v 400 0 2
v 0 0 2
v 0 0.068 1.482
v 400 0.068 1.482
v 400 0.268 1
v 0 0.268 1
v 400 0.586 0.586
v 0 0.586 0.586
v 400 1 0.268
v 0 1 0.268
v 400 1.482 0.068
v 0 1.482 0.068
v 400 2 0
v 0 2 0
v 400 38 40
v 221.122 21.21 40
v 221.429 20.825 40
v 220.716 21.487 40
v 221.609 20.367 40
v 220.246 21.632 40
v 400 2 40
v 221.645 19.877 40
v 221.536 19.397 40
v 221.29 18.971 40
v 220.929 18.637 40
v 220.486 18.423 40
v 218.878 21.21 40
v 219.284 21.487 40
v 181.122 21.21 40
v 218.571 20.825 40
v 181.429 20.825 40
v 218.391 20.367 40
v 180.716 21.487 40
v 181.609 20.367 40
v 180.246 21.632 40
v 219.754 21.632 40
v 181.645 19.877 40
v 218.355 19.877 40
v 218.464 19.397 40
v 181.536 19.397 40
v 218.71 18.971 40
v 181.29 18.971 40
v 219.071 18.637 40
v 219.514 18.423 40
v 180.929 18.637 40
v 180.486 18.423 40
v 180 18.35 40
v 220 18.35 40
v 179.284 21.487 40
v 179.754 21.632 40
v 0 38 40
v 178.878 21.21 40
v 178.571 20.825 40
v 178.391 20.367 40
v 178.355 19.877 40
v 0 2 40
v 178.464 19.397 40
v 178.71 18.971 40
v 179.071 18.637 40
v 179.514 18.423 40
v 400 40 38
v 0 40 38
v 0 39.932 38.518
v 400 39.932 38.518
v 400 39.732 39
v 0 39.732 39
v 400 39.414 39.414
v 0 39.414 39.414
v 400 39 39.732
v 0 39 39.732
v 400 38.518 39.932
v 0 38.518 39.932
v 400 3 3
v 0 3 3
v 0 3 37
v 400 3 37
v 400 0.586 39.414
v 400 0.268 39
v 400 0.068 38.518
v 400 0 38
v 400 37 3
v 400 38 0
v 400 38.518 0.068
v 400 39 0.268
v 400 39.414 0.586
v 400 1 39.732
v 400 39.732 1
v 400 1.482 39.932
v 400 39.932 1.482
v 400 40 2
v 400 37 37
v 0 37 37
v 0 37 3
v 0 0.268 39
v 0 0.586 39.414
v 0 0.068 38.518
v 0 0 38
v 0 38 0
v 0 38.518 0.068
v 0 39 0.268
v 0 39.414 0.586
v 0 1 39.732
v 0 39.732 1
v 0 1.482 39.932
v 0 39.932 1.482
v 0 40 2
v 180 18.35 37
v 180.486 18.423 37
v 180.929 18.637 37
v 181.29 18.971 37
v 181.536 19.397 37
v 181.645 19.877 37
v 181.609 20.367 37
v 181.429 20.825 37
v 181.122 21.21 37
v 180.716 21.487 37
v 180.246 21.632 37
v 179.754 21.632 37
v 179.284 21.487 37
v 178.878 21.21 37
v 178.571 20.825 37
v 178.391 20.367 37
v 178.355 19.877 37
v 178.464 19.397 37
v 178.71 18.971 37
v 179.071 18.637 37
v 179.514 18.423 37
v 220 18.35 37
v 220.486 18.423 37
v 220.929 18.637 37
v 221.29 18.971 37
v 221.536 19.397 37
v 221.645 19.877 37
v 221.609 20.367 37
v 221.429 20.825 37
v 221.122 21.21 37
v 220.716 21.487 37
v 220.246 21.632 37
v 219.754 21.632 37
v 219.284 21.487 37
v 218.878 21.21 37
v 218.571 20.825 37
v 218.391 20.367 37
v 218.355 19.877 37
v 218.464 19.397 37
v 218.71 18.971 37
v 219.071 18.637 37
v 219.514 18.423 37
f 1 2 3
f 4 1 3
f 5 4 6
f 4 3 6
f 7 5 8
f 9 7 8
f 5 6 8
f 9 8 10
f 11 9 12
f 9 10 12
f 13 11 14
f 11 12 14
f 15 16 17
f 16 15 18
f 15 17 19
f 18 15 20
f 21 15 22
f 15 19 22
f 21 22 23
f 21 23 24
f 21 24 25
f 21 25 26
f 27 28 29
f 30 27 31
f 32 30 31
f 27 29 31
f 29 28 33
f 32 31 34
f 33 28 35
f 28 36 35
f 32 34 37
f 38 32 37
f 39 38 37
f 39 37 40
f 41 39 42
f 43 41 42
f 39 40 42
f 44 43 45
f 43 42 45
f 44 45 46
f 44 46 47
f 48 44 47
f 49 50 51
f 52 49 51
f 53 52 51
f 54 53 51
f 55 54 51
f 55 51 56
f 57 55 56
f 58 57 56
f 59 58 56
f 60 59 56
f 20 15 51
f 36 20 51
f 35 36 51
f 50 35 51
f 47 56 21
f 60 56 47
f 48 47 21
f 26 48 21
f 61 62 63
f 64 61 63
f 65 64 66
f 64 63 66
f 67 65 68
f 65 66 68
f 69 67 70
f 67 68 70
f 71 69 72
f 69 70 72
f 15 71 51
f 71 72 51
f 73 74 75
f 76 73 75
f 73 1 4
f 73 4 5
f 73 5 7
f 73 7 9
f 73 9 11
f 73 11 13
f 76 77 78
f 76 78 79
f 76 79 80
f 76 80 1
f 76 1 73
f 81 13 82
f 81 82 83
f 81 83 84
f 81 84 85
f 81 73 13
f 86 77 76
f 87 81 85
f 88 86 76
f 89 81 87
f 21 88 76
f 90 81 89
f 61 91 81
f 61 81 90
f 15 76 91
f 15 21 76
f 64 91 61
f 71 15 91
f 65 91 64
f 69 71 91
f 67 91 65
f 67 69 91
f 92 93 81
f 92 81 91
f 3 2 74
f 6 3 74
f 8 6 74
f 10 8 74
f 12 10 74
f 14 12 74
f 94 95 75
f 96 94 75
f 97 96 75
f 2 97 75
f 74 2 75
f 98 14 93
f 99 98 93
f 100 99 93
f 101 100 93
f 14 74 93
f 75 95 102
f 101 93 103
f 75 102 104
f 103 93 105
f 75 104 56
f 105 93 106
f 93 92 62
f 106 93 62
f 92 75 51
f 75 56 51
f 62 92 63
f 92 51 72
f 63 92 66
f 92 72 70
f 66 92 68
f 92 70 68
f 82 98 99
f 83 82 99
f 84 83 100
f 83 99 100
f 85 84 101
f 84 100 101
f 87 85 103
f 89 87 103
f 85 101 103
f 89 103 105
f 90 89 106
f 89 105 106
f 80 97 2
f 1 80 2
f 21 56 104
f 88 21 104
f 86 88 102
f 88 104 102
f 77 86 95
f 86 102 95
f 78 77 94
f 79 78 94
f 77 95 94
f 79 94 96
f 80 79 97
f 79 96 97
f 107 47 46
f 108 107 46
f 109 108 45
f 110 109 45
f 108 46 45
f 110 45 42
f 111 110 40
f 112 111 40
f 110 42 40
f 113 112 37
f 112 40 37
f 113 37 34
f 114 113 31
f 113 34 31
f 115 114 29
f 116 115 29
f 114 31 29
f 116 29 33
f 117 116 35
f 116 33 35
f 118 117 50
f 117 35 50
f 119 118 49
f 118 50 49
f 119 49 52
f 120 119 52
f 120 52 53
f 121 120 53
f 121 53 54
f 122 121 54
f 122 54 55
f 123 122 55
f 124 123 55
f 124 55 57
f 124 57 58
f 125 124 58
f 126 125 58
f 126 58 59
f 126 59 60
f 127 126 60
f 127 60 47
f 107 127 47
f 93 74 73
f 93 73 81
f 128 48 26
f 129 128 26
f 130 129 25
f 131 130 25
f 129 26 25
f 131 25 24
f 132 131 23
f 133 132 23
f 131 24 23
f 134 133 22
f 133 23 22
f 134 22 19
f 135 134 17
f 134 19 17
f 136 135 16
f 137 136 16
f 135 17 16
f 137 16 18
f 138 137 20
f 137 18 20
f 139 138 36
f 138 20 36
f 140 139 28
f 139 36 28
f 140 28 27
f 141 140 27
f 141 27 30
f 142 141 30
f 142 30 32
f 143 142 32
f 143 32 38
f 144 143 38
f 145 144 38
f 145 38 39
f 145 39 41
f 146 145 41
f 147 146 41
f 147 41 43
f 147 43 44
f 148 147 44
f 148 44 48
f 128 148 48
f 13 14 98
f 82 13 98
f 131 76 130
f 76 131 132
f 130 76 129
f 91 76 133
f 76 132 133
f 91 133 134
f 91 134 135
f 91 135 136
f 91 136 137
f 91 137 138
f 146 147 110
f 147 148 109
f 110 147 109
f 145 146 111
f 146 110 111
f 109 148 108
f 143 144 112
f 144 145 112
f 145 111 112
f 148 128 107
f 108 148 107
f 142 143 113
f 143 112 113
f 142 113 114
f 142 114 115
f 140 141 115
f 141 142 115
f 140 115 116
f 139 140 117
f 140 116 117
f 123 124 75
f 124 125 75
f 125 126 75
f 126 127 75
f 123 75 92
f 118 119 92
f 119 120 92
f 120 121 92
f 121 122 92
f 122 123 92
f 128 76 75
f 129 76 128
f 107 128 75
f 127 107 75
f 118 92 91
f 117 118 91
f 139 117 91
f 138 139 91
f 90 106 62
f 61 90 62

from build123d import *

# Parameters (mm, degrees)
SKETCH_W    = 34
SKETCH_H    = 34
PAD_DEPTH   = 400
SKETCH001_R = 1.65
HOLE_DEPTH  = 25
HOLE_TIPS_R = 1.65


with BuildPart() as part:
    # Sketch → Pad (new body)
    with BuildSketch(Plane.YZ):
        with BuildLine():
            Line((2, 0), (38, 0))
            ThreePointArc((38, 0), (39.414214, 0.585786), (40, 2))
            Line((40, 2), (40, 38))
            ThreePointArc((40, 38), (39.414214, 39.414214), (38, 40))
            Line((38, 40), (2, 40))
            ThreePointArc((2, 40), (0.585786, 39.414214), (0, 38))
            Line((0, 38), (0, 2))
            ThreePointArc((0, 2), (0.585786, 0.585786), (2, 0))
        make_face()
        with Locations((20, 20)):
            Rectangle(SKETCH_W, SKETCH_H, mode=Mode.SUBTRACT)
    extrude(amount=PAD_DEPTH)

    # Sketch001 (on Face5 of Pad) → Hole (cut)
    with BuildSketch(Plane(origin=(0, 0, 40), x_dir=(0, -1, 0), z_dir=(0, 0, 1))):
        with Locations((-20, 180)):
            Circle(SKETCH001_R)
        with Locations((-20, 220)):
            Circle(SKETCH001_R)
    extrude(amount=-HOLE_DEPTH, mode=Mode.SUBTRACT)

    # Hole tips → Hole tip 1 section 0
    with BuildSketch(Plane(origin=(0, 0, 15), x_dir=(0, -1, 0), z_dir=(0, 0, 1)), mode=Mode.PRIVATE) as hole_tip_1_s0:
        with Locations((-20, 180)):
            Circle(HOLE_TIPS_R)
    loft([hole_tip_1_s0.sketch, Vertex(180, 20, 14.00858)], mode=Mode.SUBTRACT)

    # Hole tips → Hole tip 2 section 0
    with BuildSketch(Plane(origin=(0, 0, 15), x_dir=(0, -1, 0), z_dir=(0, 0, 1)), mode=Mode.PRIVATE) as hole_tip_2_s0:
        with Locations((-20, 220)):
            Circle(HOLE_TIPS_R)
    loft([hole_tip_2_s0.sketch, Vertex(220, 20, 14.00858)], mode=Mode.SUBTRACT)


solid = part.part
